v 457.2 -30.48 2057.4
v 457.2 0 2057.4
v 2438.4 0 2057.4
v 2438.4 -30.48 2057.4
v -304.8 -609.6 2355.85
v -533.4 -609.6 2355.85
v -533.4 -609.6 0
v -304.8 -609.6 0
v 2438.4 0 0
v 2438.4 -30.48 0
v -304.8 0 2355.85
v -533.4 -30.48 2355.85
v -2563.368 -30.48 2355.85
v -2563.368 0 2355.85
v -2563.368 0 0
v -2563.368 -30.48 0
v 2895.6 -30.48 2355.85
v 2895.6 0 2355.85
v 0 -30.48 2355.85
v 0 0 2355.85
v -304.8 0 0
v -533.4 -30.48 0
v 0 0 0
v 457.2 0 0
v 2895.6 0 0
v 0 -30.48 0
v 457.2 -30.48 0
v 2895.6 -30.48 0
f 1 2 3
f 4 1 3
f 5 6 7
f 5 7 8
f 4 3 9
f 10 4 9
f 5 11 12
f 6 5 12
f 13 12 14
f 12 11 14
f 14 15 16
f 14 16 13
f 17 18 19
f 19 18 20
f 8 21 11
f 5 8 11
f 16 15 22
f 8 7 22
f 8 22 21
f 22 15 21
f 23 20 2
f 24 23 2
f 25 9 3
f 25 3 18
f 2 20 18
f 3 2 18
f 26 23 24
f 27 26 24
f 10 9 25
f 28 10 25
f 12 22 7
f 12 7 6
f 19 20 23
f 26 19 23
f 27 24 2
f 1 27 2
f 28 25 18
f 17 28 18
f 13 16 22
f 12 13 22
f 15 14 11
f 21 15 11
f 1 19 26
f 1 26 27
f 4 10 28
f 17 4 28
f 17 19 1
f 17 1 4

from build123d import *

# Parameters (mm, degrees)
F0_W     = 2029.968
F0_H     = 2355.85
F0_W_2   = 228.6
F1_DEPTH = 30.48
F2_DEPTH = 609.6


with BuildPart() as f1:
    # F0 (on Front) → F1 (new body)
    with BuildSketch(Plane.XZ):
        with Locations((-1548.384, 1177.925)):
            Rectangle(F0_W, F0_H)
        with Locations((-419.1, 1177.925)):
            Rectangle(F0_W_2, F0_H)
        Polygon((0, 2355.85), (0, 0), (457.2, 0), (457.2, 2057.4), (2438.4, 2057.4), (2438.4, 0), (2895.6, 0), (2895.6, 2355.85), align=None)
    extrude(amount=F1_DEPTH)

    # F0 (on Front) → F2 (join)
    with BuildSketch(Plane.XZ):
        with Locations((-419.1, 1177.925)):
            Rectangle(F0_W_2, F0_H)
    extrude(amount=F2_DEPTH)


solid = f1.part
